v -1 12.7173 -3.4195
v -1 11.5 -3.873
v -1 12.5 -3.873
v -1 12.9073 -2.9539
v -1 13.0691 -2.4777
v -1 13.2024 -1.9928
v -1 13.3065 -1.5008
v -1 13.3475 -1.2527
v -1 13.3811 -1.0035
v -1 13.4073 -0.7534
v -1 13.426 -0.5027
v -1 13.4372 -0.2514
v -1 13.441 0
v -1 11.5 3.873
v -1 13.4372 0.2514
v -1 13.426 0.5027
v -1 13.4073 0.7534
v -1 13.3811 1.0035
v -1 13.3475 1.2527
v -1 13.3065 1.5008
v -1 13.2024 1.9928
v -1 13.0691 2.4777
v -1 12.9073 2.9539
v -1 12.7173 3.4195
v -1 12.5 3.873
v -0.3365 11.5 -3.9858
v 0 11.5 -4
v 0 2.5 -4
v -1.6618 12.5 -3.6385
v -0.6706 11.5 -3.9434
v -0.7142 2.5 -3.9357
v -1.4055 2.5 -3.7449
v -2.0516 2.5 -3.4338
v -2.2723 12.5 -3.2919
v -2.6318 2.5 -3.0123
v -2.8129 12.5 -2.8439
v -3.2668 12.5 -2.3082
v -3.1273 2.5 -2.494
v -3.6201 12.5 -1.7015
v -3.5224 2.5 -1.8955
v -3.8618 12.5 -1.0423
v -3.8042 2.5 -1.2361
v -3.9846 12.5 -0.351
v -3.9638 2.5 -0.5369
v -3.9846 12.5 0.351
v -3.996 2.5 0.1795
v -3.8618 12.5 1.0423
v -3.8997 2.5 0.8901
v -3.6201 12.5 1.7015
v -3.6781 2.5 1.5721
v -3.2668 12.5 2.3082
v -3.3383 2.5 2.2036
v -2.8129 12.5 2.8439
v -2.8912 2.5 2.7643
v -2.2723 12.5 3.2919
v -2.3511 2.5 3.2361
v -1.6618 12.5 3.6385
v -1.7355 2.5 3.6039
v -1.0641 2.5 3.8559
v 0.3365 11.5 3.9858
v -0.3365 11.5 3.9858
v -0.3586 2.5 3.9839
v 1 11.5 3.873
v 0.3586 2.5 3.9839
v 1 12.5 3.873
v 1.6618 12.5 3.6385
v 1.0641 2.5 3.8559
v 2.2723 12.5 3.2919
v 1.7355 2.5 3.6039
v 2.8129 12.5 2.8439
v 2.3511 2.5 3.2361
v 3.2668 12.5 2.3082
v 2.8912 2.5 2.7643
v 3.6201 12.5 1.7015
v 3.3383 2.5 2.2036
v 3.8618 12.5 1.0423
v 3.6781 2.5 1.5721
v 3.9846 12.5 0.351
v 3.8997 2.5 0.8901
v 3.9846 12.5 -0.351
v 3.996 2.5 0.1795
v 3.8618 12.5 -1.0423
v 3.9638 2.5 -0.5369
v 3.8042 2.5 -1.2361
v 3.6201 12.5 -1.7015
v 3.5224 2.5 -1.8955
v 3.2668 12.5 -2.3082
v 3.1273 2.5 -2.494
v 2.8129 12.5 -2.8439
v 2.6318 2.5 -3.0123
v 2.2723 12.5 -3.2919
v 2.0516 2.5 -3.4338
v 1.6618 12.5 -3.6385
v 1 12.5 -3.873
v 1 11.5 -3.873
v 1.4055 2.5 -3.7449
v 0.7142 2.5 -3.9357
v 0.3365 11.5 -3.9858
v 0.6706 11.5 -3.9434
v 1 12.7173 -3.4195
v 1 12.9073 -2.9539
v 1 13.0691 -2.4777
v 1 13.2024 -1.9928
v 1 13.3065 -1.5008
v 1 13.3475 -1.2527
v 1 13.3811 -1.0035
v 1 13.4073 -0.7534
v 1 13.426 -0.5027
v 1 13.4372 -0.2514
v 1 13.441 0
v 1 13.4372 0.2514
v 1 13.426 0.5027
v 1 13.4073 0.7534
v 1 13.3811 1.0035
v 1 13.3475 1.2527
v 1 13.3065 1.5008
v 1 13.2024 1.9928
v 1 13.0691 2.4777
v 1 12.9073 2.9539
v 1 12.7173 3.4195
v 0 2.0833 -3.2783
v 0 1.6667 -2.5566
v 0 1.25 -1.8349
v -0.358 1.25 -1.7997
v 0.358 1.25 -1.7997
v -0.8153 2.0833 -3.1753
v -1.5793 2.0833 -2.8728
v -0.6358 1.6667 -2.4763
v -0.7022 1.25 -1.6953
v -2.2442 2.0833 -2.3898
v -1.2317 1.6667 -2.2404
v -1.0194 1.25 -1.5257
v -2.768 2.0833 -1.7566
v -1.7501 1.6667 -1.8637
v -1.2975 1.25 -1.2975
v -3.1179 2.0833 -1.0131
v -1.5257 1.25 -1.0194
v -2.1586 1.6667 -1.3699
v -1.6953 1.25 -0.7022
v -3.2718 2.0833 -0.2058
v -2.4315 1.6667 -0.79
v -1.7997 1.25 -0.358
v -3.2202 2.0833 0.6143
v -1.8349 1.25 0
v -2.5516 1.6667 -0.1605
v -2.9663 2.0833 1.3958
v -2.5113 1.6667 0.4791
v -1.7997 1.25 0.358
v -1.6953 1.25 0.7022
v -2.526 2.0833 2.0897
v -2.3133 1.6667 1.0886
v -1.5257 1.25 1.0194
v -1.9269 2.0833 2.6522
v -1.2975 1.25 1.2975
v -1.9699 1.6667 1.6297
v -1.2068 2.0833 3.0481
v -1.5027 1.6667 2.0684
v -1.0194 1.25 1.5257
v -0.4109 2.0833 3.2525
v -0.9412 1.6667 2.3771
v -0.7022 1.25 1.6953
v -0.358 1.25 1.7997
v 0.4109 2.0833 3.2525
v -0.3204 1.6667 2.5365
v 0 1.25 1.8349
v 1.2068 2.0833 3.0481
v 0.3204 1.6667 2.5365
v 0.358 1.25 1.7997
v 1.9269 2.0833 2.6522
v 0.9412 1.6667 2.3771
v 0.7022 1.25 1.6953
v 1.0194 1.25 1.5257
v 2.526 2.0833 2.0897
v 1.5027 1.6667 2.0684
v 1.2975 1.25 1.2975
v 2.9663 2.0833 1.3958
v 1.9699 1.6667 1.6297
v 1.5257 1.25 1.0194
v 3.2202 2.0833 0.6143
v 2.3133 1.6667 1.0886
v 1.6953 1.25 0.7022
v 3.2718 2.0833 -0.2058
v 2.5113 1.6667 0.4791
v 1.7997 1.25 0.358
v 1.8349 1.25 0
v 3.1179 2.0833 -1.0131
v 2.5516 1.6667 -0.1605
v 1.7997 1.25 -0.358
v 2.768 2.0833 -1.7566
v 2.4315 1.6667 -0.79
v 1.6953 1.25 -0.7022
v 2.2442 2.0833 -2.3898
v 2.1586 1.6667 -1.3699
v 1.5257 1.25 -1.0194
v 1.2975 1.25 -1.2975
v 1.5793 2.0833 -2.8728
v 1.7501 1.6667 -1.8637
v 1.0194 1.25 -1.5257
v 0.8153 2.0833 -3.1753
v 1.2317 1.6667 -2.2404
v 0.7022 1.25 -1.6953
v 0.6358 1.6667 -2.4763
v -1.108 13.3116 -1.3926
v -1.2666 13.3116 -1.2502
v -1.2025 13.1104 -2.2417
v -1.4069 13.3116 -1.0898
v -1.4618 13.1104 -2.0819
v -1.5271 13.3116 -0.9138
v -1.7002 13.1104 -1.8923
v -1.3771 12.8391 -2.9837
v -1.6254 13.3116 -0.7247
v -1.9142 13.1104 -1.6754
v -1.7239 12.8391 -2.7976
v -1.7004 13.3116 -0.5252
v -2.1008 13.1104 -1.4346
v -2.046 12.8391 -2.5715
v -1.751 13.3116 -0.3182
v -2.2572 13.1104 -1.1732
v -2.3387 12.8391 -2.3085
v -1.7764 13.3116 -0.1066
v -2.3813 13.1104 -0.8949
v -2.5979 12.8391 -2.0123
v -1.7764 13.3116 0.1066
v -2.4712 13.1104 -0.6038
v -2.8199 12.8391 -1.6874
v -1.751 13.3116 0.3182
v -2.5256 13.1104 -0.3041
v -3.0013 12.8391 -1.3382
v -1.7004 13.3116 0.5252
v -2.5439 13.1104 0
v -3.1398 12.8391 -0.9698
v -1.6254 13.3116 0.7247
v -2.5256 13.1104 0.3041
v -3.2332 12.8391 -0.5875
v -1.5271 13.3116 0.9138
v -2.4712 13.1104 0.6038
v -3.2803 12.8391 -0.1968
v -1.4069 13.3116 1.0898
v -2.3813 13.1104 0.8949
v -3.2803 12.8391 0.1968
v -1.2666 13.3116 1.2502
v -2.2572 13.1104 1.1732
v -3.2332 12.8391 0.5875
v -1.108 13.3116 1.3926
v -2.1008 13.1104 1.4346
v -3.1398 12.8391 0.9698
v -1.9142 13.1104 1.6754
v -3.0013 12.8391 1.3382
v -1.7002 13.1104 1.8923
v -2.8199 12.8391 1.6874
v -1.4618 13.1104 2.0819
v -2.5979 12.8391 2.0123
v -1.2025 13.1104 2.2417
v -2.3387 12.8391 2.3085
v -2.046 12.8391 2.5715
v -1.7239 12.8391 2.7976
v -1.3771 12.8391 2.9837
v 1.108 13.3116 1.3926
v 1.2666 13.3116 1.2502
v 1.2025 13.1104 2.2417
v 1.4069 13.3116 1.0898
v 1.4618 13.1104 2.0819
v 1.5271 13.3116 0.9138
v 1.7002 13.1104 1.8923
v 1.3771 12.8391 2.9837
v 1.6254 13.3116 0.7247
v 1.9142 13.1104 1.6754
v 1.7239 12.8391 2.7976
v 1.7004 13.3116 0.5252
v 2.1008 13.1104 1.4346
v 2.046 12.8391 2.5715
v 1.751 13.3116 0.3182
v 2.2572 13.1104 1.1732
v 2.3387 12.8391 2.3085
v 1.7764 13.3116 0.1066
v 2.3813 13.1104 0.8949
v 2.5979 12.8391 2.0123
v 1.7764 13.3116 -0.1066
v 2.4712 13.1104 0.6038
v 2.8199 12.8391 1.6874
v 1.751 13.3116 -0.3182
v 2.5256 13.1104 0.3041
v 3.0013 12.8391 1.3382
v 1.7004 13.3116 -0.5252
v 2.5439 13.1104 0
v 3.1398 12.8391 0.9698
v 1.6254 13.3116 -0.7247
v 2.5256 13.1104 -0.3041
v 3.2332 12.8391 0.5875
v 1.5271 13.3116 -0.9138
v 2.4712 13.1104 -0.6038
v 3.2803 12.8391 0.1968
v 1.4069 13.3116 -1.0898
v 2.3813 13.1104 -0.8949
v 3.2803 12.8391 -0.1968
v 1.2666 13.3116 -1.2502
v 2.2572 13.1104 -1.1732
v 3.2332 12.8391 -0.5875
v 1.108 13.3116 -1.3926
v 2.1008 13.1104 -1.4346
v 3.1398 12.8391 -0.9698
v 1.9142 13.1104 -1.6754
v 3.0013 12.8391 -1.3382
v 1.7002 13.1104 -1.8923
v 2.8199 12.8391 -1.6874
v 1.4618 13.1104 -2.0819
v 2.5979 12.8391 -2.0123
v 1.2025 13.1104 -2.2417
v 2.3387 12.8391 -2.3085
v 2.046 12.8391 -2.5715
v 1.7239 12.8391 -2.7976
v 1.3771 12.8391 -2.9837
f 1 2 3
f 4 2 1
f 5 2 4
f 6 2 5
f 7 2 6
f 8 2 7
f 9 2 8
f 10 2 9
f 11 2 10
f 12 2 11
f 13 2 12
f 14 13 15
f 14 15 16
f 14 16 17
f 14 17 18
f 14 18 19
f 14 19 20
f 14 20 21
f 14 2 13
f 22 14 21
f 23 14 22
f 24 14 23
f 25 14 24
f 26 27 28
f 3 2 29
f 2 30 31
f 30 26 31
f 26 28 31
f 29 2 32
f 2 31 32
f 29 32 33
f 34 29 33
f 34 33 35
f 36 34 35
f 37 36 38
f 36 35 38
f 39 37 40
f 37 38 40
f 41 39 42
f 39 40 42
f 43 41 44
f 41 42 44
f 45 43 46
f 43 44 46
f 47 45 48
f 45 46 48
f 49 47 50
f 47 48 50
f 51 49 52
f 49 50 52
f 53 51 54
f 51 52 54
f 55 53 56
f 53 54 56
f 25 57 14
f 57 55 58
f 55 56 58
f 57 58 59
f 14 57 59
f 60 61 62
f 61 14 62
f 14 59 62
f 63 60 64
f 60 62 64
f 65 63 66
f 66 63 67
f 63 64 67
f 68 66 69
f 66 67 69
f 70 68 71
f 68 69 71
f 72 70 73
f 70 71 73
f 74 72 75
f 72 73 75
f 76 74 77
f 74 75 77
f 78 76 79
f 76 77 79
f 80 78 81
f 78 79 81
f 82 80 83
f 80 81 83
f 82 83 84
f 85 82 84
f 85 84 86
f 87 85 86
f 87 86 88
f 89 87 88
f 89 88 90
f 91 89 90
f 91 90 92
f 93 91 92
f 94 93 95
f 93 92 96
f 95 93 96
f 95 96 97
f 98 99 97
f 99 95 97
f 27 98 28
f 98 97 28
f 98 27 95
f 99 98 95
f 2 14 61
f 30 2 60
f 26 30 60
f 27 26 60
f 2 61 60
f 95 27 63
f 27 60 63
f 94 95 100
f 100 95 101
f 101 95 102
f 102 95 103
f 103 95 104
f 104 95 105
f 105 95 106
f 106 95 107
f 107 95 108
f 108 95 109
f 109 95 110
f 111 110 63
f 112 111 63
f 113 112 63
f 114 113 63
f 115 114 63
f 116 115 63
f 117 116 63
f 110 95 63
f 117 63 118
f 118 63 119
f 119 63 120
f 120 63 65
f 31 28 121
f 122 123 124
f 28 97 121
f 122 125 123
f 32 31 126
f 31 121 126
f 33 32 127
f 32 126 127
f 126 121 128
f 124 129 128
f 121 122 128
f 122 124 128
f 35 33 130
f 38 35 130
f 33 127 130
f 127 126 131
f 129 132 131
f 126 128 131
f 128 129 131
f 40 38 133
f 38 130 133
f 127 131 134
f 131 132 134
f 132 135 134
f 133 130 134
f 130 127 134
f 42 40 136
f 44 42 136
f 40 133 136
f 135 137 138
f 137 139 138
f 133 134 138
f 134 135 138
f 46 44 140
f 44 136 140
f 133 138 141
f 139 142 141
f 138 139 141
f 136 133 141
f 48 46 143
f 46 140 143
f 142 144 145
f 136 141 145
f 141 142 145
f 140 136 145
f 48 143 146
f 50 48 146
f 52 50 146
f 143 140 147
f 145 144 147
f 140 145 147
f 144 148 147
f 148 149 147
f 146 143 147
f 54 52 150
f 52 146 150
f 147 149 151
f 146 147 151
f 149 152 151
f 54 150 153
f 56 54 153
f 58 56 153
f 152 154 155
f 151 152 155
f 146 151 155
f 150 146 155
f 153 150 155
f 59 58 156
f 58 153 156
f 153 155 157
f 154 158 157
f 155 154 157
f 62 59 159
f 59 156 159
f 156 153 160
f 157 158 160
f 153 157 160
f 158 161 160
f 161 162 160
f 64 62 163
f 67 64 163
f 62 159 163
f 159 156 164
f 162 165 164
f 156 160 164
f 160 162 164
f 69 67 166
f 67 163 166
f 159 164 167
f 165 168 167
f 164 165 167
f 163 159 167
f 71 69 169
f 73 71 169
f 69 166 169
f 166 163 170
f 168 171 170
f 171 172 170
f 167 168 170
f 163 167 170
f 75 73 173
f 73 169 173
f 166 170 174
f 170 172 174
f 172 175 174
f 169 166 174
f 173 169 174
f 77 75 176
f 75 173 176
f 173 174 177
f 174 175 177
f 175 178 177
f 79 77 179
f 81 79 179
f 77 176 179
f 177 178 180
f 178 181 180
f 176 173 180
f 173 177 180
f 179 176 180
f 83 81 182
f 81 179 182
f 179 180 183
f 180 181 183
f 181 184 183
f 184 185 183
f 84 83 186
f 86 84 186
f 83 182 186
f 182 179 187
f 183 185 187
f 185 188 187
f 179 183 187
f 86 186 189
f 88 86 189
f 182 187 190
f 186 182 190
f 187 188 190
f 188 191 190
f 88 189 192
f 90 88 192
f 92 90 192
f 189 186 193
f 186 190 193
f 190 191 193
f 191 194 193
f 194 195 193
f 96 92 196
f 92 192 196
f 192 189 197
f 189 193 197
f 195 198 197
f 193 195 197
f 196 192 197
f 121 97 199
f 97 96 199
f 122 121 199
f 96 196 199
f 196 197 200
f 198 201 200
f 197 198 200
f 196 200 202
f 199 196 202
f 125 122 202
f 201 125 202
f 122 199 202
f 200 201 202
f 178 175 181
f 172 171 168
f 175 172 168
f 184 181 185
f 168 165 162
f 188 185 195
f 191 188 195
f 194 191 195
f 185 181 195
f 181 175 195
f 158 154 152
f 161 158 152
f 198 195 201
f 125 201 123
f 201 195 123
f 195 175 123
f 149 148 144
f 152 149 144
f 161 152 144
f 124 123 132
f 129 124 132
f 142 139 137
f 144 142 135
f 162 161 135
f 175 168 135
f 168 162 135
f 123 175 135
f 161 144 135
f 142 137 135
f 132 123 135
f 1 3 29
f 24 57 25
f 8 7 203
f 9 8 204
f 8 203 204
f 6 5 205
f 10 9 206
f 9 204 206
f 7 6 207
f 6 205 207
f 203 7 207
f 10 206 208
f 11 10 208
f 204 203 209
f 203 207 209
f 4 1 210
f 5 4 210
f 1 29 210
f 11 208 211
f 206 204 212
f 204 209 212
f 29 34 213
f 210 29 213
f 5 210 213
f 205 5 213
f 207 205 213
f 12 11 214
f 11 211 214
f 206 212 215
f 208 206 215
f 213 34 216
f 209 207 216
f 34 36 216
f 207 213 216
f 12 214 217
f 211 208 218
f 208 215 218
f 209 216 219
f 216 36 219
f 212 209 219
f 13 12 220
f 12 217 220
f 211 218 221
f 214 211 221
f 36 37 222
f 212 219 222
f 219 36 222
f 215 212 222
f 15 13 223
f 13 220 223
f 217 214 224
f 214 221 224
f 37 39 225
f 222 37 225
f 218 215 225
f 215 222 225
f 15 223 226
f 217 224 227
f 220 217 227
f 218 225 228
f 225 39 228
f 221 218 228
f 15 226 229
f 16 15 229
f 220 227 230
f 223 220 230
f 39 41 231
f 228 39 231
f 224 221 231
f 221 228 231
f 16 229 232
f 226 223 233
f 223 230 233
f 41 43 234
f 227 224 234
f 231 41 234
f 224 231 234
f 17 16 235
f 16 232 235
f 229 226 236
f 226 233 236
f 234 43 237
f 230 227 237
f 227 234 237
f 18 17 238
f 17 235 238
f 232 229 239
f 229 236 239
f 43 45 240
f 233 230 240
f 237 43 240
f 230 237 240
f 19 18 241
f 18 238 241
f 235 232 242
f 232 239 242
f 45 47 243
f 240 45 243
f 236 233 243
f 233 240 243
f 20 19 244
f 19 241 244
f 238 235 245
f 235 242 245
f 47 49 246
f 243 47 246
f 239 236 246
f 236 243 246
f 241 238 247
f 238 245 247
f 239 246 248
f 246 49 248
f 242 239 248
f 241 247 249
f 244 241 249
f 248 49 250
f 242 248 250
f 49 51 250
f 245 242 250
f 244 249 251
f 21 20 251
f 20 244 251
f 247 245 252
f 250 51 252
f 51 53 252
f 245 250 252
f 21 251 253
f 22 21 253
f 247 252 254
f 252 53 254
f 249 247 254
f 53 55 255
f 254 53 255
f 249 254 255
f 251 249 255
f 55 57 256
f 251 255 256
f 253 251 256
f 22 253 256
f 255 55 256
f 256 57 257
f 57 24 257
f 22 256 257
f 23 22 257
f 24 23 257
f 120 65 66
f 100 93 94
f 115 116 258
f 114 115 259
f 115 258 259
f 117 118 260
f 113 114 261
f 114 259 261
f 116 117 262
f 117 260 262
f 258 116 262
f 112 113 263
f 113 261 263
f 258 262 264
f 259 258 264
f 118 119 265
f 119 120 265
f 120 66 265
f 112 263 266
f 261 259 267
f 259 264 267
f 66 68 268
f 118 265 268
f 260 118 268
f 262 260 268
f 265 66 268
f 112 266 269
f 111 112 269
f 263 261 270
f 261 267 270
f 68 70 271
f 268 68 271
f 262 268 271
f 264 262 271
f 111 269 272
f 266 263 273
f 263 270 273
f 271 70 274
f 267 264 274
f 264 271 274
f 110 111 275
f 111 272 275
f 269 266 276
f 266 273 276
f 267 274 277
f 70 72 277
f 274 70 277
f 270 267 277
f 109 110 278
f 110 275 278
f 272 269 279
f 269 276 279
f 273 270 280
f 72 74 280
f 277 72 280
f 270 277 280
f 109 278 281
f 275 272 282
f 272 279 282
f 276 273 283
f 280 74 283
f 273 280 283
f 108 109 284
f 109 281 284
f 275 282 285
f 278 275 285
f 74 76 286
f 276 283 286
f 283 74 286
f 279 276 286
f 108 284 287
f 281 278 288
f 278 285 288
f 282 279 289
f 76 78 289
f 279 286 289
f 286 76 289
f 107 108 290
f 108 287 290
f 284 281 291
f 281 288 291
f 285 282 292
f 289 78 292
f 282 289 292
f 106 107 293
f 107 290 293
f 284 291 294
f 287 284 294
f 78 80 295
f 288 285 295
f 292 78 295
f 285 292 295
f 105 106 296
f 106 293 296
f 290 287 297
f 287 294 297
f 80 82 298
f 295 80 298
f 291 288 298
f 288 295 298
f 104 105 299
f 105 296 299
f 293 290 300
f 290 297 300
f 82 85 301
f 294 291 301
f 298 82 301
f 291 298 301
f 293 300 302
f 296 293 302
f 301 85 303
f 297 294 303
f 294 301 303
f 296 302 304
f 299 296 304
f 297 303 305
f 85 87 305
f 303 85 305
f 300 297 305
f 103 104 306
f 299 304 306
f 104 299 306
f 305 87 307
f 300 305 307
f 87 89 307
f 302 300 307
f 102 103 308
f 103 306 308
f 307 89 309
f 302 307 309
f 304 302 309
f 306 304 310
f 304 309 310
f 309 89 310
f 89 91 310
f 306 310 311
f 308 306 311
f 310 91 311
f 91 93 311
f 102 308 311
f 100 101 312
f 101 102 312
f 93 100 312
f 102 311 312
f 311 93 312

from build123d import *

# Parameters (mm, degrees)
SKETCH_2_W          = 2
SKETCH_2_H          = 2.409546764
CUT_EXTRUDE_1_DEPTH = 5


with BuildPart() as part:
    # 草圖1 → 旋轉1 (revolve)
    with BuildSketch(Plane.XY, mode=Mode.PRIVATE) as revolve_1_sk:
        with BuildLine():
            Line((-4, 12.5), (-4, 2.5))
            Line((-4, 2.5), (-1.834936491, 1.25))
            Line((-1.834936491, 1.25), (0, 1.25))
            Line((0, 1.25), (0, 13.5))
            ThreePointArc((0, 13.5), (-2.061552813, 13.246211251), (-4, 12.5))
        make_face()
    revolve(revolve_1_sk.sketch.rotate(Axis((0, 0, 0), (0, 1, 0)), 270), axis=Axis((0, 0, 0), (0, 1, 0)))

    # 草圖2 → 除料-伸長1 (cut, symmetric)
    with BuildSketch(Plane.XY):
        with Locations((0, 12.704773382)):
            Rectangle(SKETCH_2_W, SKETCH_2_H)
    extrude(amount=CUT_EXTRUDE_1_DEPTH, both=True, mode=Mode.SUBTRACT)


solid = part.part
